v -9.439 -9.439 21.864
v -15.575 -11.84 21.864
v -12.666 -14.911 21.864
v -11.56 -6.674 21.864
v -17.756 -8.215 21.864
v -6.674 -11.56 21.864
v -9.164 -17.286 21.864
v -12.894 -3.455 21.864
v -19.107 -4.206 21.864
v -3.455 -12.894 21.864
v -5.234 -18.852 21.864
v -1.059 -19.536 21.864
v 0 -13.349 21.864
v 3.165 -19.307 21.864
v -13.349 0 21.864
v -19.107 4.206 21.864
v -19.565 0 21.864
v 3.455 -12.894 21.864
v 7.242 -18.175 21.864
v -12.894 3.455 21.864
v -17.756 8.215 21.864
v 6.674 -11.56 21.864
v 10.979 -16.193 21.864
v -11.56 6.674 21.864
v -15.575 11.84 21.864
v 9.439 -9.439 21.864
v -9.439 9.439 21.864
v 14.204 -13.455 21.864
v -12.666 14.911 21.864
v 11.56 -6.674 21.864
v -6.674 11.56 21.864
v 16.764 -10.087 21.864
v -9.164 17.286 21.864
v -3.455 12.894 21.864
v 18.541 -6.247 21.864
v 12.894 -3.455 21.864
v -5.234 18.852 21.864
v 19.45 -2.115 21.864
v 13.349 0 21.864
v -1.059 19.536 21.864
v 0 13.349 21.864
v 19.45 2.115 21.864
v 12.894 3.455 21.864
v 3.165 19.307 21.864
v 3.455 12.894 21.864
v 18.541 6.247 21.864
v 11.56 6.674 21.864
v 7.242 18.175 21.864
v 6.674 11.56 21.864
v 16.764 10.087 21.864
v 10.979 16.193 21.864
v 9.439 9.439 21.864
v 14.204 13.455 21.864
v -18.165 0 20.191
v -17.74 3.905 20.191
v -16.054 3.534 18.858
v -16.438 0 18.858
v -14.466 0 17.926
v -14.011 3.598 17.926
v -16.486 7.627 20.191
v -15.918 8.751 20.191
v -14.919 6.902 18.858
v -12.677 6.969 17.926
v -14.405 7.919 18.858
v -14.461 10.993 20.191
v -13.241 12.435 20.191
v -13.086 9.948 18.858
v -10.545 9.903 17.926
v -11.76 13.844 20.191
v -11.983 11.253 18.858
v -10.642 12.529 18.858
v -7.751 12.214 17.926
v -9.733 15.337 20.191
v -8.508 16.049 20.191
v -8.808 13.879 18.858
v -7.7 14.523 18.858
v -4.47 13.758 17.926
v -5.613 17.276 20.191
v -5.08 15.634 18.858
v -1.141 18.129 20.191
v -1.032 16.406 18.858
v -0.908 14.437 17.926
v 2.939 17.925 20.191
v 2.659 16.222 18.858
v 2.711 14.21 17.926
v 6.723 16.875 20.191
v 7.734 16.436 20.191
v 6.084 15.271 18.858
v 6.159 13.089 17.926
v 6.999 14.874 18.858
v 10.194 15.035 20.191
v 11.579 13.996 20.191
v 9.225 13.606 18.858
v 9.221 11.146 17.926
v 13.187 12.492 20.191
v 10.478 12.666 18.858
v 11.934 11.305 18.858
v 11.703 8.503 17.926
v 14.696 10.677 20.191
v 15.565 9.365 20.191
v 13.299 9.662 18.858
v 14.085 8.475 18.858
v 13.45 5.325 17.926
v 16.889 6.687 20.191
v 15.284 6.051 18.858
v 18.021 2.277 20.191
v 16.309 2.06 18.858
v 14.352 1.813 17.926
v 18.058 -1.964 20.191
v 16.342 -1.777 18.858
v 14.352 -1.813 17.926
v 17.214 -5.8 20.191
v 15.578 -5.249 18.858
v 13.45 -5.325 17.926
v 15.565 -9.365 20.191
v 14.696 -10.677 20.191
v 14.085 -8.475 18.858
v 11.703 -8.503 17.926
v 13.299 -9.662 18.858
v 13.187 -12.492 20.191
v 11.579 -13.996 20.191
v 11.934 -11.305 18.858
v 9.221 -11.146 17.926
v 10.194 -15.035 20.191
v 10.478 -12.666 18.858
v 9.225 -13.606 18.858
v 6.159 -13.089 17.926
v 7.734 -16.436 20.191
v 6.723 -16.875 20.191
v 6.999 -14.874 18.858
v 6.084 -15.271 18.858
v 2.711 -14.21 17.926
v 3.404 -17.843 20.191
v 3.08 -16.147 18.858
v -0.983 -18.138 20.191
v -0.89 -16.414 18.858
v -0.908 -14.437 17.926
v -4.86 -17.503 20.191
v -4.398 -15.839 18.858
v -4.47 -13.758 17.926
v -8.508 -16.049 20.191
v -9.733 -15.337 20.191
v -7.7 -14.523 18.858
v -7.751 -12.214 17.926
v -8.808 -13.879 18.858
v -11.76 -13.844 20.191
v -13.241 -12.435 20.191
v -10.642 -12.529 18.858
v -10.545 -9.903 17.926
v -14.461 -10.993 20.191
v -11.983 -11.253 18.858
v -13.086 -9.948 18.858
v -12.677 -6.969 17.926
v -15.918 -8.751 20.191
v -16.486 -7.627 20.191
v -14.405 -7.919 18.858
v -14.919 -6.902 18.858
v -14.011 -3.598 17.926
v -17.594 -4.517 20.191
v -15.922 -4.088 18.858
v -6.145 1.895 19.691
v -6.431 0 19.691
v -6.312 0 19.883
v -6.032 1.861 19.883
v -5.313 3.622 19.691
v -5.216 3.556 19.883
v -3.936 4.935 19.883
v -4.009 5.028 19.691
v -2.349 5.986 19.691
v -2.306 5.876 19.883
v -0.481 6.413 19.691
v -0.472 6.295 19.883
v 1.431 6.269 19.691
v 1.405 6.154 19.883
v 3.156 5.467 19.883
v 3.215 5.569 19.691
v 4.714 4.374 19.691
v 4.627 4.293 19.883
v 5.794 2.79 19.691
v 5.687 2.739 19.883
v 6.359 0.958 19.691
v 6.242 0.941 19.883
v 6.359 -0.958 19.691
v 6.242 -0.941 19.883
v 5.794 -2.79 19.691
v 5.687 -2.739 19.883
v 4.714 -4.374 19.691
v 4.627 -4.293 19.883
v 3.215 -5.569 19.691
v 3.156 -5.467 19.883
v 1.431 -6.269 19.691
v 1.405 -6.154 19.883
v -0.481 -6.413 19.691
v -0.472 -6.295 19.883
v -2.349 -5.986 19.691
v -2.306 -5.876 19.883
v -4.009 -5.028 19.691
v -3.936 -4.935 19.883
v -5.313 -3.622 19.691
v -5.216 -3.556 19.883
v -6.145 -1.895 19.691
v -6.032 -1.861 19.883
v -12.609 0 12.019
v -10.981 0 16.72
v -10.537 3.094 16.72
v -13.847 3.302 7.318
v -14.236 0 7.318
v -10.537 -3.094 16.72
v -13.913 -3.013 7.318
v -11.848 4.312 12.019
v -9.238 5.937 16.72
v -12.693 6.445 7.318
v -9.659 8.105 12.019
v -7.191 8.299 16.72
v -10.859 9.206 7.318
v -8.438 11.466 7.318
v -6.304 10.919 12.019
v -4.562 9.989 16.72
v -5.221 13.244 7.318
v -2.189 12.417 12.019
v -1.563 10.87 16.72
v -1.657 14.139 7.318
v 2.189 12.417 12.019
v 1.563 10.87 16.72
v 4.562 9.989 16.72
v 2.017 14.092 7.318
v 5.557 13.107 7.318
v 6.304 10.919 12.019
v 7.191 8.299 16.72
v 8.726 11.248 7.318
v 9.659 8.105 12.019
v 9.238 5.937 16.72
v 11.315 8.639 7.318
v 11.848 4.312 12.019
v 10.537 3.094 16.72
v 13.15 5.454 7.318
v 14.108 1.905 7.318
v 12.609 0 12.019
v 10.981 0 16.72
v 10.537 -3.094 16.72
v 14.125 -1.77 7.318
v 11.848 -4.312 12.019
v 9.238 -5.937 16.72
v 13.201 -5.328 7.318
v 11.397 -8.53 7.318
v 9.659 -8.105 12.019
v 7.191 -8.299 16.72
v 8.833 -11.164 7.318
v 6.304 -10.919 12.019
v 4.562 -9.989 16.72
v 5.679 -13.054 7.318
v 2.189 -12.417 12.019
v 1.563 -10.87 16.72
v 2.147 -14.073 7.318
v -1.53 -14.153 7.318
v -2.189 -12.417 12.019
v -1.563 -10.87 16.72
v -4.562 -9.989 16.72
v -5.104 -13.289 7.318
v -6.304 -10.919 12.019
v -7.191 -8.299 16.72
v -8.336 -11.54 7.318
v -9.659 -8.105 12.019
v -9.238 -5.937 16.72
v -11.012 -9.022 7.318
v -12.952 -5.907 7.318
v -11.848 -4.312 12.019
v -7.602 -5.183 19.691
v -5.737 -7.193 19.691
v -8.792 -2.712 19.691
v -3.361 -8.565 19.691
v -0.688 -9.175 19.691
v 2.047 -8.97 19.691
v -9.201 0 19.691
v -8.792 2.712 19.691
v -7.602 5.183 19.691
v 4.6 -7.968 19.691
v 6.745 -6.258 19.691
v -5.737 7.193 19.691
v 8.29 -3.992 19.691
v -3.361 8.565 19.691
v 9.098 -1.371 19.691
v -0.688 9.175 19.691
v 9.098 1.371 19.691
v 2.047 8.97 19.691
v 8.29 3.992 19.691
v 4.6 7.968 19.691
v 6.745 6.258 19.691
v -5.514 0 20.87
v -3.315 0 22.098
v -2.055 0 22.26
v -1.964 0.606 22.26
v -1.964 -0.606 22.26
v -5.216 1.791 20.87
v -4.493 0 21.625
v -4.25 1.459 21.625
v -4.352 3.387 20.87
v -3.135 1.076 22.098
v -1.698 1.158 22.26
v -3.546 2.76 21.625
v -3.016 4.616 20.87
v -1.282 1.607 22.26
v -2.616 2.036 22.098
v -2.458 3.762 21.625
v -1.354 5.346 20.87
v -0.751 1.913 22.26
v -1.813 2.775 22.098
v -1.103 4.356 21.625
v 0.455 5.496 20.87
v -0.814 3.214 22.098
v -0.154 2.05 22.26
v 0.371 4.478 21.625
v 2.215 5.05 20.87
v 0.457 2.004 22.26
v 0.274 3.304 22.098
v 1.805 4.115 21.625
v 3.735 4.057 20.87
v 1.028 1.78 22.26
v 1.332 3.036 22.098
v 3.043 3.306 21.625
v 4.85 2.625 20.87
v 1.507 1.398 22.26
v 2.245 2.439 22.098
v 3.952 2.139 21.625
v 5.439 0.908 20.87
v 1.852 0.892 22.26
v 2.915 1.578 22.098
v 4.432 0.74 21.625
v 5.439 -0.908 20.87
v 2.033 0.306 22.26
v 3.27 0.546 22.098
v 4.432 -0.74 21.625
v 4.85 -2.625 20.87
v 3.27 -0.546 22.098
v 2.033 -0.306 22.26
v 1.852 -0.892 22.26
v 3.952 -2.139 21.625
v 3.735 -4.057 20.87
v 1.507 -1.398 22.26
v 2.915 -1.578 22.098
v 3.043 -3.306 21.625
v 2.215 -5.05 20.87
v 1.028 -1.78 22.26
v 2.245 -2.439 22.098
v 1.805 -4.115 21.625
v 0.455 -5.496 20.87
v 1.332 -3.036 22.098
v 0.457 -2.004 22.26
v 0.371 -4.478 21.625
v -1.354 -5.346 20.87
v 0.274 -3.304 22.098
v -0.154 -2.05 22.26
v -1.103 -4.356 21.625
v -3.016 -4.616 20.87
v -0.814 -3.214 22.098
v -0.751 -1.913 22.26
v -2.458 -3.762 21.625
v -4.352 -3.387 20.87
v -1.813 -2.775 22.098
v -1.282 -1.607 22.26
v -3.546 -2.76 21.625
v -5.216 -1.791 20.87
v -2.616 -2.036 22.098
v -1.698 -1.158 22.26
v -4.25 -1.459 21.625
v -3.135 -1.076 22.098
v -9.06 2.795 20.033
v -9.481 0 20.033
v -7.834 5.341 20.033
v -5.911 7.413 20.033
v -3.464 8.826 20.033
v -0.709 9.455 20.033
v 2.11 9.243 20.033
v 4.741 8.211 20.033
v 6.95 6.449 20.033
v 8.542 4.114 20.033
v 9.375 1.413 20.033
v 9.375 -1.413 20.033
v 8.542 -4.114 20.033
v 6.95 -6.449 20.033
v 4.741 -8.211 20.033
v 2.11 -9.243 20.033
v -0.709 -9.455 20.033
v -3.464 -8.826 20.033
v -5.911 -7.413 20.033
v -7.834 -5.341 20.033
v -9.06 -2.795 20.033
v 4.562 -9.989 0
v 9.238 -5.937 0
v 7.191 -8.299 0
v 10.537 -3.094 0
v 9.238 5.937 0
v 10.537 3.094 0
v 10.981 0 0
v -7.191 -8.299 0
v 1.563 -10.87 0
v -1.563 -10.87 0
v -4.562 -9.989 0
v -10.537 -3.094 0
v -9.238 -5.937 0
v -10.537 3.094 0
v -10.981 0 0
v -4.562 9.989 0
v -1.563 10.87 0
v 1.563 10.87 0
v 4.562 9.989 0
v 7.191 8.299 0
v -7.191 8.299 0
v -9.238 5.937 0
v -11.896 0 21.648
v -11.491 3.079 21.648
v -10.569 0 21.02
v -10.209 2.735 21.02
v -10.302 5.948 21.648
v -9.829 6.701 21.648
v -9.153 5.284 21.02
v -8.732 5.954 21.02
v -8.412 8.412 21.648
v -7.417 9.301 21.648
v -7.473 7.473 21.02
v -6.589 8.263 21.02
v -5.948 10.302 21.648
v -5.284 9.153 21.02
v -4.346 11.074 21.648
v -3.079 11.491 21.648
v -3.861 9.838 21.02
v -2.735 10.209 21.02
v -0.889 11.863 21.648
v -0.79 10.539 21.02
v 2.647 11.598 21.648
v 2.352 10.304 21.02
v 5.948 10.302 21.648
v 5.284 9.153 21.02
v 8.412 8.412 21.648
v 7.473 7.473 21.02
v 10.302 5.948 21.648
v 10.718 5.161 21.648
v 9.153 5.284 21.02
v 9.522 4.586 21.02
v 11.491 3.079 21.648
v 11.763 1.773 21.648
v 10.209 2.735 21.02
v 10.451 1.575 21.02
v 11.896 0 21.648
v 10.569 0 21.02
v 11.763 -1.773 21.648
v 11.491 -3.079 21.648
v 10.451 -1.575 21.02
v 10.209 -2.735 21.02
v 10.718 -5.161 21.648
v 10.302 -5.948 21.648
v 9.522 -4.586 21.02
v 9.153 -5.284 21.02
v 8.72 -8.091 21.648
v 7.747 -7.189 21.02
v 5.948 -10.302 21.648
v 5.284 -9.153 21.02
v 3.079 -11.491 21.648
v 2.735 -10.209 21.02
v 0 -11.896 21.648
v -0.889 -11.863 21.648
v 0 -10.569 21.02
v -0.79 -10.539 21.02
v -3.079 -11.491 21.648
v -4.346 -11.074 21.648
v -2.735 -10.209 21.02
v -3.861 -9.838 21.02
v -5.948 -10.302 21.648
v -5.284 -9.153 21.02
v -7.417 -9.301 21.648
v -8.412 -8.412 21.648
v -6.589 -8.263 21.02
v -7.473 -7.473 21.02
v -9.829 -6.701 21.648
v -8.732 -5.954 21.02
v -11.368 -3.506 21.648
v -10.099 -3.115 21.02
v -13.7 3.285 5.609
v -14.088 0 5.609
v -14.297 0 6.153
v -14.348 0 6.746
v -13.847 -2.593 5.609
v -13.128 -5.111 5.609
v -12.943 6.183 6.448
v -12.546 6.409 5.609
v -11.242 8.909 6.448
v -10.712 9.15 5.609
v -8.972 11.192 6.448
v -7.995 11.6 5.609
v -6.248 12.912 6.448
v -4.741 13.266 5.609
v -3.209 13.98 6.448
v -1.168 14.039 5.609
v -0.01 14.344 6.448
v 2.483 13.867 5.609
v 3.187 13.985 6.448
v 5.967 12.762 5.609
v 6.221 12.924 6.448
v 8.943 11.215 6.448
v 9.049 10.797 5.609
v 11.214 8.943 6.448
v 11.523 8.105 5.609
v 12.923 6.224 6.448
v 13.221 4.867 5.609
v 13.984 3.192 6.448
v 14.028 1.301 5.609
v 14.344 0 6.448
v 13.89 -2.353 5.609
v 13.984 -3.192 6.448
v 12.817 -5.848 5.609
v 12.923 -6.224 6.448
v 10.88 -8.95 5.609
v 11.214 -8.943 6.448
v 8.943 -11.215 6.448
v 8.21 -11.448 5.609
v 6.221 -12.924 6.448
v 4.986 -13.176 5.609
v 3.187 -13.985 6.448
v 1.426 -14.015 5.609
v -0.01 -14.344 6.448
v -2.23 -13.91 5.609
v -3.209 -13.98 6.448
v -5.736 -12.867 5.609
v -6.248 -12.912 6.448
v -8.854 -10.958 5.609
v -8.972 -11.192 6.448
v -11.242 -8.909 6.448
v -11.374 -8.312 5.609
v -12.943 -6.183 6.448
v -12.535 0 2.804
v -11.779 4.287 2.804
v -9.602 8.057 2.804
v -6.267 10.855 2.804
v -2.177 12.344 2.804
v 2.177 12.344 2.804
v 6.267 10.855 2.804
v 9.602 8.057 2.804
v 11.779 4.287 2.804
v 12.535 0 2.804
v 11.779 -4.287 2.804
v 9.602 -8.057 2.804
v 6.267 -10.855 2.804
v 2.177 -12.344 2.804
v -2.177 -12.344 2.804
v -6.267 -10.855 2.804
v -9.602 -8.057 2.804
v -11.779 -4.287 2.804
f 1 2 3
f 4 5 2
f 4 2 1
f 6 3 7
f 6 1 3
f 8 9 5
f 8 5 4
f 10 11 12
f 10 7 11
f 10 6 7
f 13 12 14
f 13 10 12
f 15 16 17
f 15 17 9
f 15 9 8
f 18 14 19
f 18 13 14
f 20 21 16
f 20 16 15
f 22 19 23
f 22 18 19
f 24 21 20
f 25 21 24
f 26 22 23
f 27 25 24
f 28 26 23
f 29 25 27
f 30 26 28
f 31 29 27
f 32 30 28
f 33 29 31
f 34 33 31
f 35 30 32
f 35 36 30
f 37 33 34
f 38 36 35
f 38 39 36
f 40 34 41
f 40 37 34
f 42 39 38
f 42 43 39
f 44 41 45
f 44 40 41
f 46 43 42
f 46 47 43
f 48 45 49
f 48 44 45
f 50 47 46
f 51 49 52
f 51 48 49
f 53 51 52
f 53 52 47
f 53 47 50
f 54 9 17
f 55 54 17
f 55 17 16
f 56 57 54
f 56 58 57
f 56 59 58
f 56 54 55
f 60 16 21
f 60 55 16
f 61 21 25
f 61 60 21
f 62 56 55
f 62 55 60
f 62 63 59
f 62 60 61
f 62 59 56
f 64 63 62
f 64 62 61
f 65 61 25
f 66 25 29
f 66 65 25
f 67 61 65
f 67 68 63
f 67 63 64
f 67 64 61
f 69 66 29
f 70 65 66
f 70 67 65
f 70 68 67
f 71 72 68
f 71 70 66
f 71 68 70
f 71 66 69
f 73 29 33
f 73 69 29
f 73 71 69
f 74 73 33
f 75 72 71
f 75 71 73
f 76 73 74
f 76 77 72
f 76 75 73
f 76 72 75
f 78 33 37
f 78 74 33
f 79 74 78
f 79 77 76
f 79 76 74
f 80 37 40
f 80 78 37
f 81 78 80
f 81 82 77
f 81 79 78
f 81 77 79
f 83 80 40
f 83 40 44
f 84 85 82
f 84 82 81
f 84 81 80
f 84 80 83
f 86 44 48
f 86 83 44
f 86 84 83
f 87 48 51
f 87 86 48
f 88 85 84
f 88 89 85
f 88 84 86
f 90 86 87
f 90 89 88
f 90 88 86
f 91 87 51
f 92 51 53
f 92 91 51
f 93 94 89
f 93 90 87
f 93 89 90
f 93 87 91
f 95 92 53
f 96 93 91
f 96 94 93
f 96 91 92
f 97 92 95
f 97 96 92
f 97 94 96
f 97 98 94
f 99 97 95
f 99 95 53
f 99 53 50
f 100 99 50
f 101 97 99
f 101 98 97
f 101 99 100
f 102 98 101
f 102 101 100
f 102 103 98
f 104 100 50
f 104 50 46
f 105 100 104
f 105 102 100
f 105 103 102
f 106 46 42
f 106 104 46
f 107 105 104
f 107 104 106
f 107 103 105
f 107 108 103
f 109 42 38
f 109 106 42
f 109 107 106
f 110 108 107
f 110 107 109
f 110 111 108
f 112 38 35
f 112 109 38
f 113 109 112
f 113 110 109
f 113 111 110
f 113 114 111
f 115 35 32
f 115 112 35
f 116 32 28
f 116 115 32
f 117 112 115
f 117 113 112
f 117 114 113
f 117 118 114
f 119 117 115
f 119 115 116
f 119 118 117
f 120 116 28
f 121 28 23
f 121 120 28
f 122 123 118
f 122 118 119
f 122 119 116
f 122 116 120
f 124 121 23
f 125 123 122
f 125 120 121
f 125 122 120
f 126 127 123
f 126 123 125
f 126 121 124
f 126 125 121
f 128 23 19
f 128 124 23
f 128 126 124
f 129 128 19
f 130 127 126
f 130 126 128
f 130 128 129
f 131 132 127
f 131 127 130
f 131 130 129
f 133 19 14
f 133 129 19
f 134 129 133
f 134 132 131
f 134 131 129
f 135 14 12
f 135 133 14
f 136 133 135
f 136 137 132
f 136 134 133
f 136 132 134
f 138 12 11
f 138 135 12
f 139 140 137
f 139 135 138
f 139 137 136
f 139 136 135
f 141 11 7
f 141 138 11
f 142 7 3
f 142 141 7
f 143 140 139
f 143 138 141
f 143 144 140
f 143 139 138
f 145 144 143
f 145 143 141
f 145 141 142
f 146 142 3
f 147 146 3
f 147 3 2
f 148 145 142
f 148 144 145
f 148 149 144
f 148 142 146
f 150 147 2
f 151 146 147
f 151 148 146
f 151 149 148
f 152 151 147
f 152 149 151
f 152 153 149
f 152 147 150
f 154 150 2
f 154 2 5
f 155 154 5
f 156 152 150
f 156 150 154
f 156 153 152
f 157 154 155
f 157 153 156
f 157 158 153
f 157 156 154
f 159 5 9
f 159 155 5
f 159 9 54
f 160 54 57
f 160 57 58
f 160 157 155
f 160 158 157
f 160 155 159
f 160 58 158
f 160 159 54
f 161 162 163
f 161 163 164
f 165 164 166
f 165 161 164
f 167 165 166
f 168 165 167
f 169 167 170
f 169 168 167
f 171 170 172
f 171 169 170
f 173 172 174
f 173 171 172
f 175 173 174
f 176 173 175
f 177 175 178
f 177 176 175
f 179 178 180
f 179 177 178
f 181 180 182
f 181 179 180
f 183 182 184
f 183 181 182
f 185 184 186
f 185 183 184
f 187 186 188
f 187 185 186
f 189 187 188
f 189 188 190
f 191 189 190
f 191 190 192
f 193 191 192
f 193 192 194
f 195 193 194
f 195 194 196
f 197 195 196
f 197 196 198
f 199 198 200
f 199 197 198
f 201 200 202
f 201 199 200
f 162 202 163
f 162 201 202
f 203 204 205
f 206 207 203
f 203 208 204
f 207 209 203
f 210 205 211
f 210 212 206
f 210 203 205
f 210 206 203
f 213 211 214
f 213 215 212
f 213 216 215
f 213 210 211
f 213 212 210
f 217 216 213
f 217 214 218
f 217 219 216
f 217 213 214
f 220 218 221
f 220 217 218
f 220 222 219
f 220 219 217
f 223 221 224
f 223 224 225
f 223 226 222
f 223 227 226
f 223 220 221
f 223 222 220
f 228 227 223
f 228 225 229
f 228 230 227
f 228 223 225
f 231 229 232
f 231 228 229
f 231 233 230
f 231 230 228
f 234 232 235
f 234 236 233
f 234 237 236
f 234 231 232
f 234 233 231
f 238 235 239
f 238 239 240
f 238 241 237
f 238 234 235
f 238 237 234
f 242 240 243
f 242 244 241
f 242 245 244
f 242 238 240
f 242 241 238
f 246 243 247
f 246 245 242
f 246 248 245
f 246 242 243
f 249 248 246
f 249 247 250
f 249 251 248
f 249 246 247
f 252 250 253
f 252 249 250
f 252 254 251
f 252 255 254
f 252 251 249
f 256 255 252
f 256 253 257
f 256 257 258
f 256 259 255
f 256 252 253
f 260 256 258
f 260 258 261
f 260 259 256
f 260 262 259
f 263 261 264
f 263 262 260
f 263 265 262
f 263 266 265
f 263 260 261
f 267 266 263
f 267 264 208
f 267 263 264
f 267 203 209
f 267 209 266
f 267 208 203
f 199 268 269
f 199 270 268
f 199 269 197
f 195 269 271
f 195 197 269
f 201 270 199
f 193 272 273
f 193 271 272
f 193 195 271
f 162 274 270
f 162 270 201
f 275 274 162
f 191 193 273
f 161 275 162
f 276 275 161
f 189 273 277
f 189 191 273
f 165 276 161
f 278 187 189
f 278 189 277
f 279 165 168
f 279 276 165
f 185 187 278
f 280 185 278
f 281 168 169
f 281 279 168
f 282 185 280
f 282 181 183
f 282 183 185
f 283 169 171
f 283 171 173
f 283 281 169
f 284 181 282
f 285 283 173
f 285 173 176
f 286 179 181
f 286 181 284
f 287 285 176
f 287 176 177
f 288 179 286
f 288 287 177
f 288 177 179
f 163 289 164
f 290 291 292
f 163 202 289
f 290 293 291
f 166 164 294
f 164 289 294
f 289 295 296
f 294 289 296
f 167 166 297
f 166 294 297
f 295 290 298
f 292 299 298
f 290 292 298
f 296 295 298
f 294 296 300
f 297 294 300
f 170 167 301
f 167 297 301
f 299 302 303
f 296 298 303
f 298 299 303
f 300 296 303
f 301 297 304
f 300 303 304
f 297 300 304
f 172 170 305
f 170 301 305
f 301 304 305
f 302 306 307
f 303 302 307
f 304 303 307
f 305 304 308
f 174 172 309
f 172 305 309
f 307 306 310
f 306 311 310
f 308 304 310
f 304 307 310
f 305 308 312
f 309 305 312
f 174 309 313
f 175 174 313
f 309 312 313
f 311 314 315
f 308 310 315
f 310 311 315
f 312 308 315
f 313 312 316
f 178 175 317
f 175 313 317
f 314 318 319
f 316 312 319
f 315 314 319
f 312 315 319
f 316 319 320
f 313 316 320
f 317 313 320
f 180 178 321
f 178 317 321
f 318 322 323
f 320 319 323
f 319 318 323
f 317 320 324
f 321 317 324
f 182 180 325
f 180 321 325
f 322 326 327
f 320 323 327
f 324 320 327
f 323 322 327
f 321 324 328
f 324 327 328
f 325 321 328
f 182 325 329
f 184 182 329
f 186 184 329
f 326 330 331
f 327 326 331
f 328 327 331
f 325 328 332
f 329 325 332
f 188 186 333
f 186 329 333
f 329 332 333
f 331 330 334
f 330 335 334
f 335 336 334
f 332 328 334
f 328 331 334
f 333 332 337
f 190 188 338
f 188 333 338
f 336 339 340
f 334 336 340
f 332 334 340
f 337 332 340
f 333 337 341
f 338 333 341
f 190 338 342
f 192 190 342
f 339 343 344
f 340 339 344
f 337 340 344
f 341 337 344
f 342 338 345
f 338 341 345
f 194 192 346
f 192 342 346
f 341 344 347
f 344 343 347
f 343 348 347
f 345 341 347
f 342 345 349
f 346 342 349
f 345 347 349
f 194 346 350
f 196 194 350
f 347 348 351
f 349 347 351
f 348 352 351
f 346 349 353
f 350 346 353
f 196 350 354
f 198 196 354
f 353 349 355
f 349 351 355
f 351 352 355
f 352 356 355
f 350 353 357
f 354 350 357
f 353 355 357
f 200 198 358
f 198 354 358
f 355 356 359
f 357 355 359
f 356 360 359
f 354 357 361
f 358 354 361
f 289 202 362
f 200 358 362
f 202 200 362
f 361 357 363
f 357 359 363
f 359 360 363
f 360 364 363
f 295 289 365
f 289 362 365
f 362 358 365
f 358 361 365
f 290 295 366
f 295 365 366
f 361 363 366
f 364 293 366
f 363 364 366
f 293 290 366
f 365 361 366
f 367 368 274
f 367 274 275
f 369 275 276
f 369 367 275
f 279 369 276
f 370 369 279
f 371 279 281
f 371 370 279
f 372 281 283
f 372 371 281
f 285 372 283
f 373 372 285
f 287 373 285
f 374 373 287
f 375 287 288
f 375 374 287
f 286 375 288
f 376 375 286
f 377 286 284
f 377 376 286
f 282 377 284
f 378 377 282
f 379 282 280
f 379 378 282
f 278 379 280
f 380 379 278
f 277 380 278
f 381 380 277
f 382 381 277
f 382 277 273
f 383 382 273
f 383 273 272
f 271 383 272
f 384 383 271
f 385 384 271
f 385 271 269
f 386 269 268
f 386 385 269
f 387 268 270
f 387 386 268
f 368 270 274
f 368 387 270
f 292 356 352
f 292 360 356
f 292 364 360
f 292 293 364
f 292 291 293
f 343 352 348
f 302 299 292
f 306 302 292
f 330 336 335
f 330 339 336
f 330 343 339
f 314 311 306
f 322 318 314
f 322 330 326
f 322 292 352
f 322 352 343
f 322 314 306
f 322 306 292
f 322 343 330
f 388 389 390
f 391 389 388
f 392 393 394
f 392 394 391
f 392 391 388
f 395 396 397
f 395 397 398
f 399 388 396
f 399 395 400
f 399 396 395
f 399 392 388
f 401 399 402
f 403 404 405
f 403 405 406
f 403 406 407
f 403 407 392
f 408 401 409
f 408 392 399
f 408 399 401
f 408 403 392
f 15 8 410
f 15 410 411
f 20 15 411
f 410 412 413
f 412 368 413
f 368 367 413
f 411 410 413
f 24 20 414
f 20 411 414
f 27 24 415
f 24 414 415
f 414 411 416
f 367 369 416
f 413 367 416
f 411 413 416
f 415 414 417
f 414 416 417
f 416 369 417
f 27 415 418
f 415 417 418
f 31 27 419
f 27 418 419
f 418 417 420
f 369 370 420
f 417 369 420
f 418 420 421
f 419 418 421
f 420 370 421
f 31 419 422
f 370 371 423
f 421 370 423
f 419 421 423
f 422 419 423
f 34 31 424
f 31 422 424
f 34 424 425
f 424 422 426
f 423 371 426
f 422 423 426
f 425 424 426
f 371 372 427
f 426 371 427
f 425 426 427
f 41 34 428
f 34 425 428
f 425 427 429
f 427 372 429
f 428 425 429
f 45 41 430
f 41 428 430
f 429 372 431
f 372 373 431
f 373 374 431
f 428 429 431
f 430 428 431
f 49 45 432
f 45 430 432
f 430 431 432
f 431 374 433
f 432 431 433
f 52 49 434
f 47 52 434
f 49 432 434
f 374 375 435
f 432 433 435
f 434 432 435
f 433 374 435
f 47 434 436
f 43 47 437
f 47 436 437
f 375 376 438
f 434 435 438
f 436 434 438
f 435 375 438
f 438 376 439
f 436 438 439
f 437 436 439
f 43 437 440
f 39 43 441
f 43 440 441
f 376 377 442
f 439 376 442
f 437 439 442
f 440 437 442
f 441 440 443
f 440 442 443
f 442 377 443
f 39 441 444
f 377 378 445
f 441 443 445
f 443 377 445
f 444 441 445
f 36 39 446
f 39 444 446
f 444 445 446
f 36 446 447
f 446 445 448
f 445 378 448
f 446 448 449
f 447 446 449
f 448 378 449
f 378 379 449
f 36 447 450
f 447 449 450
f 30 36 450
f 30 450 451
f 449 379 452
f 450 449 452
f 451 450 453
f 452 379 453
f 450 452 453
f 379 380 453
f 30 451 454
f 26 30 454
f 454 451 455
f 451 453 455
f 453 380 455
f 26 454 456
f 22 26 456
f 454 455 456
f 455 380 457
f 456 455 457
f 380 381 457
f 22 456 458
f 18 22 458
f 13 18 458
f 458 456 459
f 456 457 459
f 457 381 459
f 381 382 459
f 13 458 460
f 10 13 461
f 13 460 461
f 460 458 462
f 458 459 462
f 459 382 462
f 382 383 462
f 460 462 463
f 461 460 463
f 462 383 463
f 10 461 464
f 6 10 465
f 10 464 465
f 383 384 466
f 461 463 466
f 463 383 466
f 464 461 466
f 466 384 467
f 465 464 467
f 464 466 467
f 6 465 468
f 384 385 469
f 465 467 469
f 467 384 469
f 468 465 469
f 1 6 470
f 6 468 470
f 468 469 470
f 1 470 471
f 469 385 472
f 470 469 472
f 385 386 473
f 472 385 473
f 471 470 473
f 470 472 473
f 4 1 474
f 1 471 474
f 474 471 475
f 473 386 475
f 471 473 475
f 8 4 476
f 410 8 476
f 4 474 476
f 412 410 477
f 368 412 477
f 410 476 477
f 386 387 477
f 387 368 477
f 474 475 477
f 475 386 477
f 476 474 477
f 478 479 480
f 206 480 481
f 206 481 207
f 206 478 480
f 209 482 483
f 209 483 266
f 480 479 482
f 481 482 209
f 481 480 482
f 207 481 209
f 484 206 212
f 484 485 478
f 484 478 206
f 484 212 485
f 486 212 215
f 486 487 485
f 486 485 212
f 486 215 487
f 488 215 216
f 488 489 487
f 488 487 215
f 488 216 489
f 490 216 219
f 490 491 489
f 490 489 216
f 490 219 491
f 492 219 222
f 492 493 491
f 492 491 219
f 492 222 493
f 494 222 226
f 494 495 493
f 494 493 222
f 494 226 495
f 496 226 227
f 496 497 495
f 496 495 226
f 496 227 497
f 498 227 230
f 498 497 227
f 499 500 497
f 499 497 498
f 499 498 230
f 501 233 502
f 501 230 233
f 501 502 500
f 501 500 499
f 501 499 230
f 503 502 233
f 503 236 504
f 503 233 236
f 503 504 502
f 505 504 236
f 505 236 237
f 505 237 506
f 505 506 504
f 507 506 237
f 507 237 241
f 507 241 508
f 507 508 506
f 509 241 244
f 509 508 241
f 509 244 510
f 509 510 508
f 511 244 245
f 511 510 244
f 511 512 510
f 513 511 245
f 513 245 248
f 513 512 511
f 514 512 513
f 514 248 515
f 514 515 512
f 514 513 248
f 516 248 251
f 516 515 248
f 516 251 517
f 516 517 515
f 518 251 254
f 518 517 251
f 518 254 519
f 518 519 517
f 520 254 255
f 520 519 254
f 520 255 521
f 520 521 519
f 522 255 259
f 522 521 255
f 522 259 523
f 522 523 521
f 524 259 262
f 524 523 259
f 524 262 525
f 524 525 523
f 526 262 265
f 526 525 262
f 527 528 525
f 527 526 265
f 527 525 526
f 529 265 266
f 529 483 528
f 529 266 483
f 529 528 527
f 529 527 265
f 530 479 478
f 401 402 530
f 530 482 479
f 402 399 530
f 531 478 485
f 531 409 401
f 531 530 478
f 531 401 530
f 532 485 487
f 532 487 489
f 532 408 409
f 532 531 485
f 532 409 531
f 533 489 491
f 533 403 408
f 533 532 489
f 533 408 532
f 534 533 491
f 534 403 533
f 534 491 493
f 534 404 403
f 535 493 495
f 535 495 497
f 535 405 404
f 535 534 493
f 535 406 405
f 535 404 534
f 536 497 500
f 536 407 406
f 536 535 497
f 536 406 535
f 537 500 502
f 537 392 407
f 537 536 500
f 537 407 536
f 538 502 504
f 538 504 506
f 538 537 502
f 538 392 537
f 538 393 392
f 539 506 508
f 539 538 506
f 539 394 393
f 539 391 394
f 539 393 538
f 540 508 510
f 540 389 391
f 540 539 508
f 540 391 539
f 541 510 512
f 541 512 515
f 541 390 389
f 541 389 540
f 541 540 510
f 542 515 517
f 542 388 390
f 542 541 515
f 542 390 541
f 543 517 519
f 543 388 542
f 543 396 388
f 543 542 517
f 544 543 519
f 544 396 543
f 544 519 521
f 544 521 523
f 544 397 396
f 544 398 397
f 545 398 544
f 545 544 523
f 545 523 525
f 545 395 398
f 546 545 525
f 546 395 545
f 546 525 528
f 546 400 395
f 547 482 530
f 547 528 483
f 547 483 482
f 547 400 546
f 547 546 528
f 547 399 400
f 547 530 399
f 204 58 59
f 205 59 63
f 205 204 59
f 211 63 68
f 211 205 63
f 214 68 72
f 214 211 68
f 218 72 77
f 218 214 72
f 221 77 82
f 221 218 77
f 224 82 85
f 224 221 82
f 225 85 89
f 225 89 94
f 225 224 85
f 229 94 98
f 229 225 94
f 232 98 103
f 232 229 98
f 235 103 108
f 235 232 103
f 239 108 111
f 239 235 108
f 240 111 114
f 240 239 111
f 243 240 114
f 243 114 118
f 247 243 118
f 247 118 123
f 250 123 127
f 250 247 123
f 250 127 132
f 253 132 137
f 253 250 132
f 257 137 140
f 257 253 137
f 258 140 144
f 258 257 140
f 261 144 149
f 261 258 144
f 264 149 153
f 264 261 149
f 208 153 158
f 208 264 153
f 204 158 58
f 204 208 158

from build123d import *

# Parameters (mm, degrees)
F3_R = 2.1064176113
F4_R = 5


# Not quite as in the source:
# - a fillet or chamfer that OpenCascade refuses, or shapes differently, is made with other operations: its cross-section is extruded or revolved along the edge and cut away or added


with BuildPart() as f1:
    # F0 (on Front) → F1 (revolve)
    with BuildSketch(Plane.XZ):
        Polygon((-10.9814703465, 0), (0, 0), (0, 22.2597364336), (-4.8476760276, 22.2597364336), (-6.4305909909, 19.6906365962), (-9.2006912455, 19.6906365962), (-10.9814703465, 21.8640081584), (-19.5646515468, 21.8640081584), (-19.5646515468, 19.6906365962), (-10.9814703465, 16.7195349932), (-14.5430285484, 6.4305905253), align=None)
    revolve(axis=Axis((0, 0, 11.1298682168), (0, 0, -1)))

    # F2: fillet of radius 10.1048761085 on 1 edges, made by hand

    # F2_s1 → F2_t2 (revolve, cut)
    with BuildSketch(Plane.XZ):
        with BuildLine():
            ThreePointArc((-19.5646515468, 21.8640081584), (-17.3375812271, 19.4776240652), (-14.4659586897, 17.9257042049))
            Line((-14.4659586897, 17.9257042049), (-19.5646515468, 19.6906365962))
            Line((-19.5646515468, 19.6906365962), (-19.5646515468, 21.8640081584))
        make_face()
    revolve(axis=Axis((0, 0, 19.6906365962), (0, 0, -1)), mode=Mode.SUBTRACT)

    # F3
    f3_edges = [f1.edges().sort_by_distance(p)[0] for p in [
        (14.543029, 0, 6.430591),
    ]]
    fillet(f3_edges, radius=F3_R)

    # F4
    f4_edges = [f1.edges().sort_by_distance(p)[0] for p in [
        (10.98147, 0, 21.864008),
        (4.847676, 0, 22.259736),
    ]]
    fillet(f4_edges, radius=F4_R)


solid = f1.part
